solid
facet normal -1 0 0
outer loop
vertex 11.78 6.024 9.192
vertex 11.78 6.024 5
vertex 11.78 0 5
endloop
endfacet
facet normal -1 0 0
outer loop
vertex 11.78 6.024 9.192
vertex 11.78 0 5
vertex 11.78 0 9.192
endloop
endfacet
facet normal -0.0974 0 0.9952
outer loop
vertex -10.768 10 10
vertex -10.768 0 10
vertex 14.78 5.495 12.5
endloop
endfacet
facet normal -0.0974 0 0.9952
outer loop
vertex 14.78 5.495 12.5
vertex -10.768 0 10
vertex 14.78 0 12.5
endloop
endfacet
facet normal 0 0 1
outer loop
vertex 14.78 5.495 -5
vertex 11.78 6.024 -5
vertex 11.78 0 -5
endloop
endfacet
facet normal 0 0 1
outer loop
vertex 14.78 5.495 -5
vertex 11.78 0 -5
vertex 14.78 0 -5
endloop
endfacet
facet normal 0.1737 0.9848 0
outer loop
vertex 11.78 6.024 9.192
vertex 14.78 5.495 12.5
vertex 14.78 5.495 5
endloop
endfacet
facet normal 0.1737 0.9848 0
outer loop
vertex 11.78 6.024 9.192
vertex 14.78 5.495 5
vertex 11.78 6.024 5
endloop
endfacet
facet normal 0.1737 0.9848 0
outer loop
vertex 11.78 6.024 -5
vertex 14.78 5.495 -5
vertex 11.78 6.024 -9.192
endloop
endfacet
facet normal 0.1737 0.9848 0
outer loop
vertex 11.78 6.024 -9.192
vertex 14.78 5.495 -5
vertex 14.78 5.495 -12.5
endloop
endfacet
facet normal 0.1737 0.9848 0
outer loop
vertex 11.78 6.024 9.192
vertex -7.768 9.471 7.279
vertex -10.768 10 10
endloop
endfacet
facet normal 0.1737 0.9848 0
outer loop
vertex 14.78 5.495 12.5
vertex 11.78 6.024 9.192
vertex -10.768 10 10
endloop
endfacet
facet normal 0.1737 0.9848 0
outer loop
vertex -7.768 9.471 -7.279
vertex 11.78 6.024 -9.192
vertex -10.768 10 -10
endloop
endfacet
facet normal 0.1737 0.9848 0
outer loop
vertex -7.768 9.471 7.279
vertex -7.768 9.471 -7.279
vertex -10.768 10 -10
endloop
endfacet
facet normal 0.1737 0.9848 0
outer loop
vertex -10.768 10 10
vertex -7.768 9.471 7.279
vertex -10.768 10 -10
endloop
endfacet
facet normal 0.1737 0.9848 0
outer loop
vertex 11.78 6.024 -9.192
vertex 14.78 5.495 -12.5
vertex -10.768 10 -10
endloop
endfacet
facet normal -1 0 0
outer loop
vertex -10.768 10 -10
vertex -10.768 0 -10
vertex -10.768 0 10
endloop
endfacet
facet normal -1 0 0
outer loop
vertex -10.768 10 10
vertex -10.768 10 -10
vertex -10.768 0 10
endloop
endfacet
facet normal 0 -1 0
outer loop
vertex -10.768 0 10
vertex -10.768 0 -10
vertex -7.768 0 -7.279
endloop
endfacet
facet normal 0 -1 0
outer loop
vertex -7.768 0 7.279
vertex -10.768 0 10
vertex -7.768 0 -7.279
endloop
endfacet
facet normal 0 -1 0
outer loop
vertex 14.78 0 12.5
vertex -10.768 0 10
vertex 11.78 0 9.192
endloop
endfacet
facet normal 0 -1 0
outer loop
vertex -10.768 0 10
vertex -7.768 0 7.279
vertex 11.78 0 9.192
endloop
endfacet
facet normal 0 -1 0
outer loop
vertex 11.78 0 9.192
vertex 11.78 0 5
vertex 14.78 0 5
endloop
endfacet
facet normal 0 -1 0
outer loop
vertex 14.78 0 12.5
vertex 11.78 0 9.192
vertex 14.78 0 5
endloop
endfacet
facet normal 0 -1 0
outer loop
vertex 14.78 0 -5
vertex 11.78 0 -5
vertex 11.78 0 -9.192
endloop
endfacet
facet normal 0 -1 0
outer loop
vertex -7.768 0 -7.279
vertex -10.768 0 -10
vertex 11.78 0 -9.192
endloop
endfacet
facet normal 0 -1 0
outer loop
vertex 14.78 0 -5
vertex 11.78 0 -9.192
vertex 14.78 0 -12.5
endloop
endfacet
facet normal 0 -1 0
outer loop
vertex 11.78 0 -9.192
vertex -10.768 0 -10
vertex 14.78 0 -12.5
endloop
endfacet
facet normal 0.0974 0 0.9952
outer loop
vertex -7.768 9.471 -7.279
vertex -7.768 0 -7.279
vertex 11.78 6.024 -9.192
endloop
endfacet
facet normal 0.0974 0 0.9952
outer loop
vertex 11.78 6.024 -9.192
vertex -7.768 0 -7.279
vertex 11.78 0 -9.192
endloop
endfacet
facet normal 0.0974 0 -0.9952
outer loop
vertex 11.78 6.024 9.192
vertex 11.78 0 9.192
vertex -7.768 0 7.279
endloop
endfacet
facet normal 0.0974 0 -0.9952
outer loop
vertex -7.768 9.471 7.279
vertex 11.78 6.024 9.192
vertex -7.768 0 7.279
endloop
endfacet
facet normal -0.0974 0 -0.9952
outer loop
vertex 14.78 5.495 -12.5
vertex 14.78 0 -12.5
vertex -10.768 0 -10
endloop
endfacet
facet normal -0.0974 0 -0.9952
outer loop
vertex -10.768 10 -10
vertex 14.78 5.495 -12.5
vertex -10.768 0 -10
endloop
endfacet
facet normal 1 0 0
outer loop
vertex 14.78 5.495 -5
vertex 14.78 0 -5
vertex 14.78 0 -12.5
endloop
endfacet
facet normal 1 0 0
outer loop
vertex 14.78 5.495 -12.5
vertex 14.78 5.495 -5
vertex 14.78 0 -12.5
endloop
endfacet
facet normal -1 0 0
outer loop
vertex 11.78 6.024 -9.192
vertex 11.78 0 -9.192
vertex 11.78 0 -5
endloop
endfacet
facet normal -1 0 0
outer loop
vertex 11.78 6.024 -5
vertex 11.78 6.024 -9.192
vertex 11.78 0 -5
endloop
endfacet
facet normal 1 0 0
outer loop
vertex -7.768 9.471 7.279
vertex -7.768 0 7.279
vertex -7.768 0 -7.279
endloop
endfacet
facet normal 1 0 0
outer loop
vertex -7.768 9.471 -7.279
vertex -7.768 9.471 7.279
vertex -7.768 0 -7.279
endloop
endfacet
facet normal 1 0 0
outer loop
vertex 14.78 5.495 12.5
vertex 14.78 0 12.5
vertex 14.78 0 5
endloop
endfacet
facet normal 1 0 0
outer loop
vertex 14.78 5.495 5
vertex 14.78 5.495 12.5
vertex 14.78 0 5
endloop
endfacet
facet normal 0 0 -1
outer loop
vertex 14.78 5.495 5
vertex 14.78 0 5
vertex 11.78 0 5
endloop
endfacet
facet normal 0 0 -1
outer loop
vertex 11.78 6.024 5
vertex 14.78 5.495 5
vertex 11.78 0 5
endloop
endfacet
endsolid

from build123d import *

# Parameters (mm, degrees)
BOSS_EXTRUDE1_DEPTH     = 15
CUT_EXTRUDE1_DEPTH      = 25.488909851
CUT_EXTRUDE1_DEPTH_BACK = 25.488909851


with BuildPart() as part:
    # Sketch1 → Boss-Extrude1 (new body)
    with BuildSketch(Plane(origin=(0, 0, 0), x_dir=(1, 0, 0), z_dir=(0, 1, 0))):
        Polygon((-10.767691547, 0), (-10.767691547, -10), (14.780280975, -12.5), (14.780280975, -5), (11.780280975, -5), (11.780280975, -9.192105414), (-7.767691547, -7.279236153), (-7.767691547, 0), (-7.767691547, 7.279236153), (11.780280975, 9.192105414), (11.780280975, 5), (14.780280975, 5), (14.780280975, 12.5), (-10.767691547, 10), align=None)
    extrude(amount=BOSS_EXTRUDE1_DEPTH)

    # Sketch2 → Cut-Extrude1 (cut, two sides: drawn at the far end of the back side and taken through both)
    with BuildSketch(Plane.XY.offset(-CUT_EXTRUDE1_DEPTH_BACK)):
        Polygon((14.780280975, 15), (14.780280975, 5.495203142), (-10.767691547, 10), (-10.767691547, 15), align=None)
    extrude(amount=CUT_EXTRUDE1_DEPTH + CUT_EXTRUDE1_DEPTH_BACK, mode=Mode.SUBTRACT)


solid = part.part
